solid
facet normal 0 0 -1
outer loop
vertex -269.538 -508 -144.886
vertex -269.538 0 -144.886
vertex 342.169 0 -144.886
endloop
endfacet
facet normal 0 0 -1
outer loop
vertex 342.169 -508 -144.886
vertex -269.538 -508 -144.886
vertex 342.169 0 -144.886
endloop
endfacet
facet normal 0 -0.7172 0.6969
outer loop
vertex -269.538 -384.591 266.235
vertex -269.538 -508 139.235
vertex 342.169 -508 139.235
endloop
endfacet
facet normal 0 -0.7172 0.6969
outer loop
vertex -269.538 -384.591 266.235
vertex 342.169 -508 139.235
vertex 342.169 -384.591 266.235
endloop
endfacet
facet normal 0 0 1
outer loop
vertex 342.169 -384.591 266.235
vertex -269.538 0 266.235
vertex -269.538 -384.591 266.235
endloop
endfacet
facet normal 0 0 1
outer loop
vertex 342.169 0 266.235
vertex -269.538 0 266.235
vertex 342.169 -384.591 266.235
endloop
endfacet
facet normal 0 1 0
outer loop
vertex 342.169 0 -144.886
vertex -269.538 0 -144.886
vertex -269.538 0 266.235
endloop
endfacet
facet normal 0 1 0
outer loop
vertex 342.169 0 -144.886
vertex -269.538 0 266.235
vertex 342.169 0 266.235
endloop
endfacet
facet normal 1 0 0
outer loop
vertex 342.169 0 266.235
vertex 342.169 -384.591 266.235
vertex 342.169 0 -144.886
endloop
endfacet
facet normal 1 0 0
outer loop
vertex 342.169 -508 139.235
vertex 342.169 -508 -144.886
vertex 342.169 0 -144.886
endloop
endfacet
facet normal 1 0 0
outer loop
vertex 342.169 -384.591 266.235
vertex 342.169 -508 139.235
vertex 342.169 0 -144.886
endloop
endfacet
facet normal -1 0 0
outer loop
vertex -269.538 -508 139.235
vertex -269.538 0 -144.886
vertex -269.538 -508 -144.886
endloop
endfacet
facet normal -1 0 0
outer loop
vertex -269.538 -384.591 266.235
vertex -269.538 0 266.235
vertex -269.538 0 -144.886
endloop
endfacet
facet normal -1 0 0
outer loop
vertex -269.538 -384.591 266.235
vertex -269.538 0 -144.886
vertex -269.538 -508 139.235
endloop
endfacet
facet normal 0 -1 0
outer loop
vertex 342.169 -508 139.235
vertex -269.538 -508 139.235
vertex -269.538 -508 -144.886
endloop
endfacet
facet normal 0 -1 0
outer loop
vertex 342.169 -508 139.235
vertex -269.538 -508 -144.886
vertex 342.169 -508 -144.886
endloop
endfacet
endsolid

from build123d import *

# Parameters (mm, degrees)
F0_W     = 611.7065250874
F0_H     = 284.1202020645
F1_DEPTH = 508
F2_W     = 611.7065250874
F2_H     = 384.5913410187
F3_DEPTH = 127
F6_DEPTH = 535.686
F7_DEPTH = 254


with BuildPart() as f1:
    # F0 (on Front) → F1 (new body)
    with BuildSketch(Plane.XZ):
        with Locations((36.3153368235, -2.8254389763)):
            Rectangle(F0_W, F0_H)
    extrude(amount=F1_DEPTH)

    # F2 (on face) → F3 (join)
    with BuildSketch(Plane.XY.offset(139.234662056)):
        with Locations((36.3153368235, -192.2956705093)):
            Rectangle(F2_W, F2_H)
    extrude(amount=F3_DEPTH)

    # F5 (on face) → F6 (join)
    with BuildSketch(Plane(origin=(-269.5379257202, 0, 0), x_dir=(0, -1, 0), z_dir=(-1, 0, 0))):
        Polygon((508, 139.234662056), (384.5913410187, 266.234662056), (384.5913410187, 139.234662056), align=None)
    extrude(amount=-F6_DEPTH)

    # F4 (on face) → F7 (join)
    with BuildSketch(Plane.YZ.offset(342.1685993671)):
        Polygon((-384.5913410187, 139.234662056), (-384.5913410187, 266.234662056), (-508, 139.234662056), align=None)
    extrude(amount=-F7_DEPTH)


solid = f1.part
